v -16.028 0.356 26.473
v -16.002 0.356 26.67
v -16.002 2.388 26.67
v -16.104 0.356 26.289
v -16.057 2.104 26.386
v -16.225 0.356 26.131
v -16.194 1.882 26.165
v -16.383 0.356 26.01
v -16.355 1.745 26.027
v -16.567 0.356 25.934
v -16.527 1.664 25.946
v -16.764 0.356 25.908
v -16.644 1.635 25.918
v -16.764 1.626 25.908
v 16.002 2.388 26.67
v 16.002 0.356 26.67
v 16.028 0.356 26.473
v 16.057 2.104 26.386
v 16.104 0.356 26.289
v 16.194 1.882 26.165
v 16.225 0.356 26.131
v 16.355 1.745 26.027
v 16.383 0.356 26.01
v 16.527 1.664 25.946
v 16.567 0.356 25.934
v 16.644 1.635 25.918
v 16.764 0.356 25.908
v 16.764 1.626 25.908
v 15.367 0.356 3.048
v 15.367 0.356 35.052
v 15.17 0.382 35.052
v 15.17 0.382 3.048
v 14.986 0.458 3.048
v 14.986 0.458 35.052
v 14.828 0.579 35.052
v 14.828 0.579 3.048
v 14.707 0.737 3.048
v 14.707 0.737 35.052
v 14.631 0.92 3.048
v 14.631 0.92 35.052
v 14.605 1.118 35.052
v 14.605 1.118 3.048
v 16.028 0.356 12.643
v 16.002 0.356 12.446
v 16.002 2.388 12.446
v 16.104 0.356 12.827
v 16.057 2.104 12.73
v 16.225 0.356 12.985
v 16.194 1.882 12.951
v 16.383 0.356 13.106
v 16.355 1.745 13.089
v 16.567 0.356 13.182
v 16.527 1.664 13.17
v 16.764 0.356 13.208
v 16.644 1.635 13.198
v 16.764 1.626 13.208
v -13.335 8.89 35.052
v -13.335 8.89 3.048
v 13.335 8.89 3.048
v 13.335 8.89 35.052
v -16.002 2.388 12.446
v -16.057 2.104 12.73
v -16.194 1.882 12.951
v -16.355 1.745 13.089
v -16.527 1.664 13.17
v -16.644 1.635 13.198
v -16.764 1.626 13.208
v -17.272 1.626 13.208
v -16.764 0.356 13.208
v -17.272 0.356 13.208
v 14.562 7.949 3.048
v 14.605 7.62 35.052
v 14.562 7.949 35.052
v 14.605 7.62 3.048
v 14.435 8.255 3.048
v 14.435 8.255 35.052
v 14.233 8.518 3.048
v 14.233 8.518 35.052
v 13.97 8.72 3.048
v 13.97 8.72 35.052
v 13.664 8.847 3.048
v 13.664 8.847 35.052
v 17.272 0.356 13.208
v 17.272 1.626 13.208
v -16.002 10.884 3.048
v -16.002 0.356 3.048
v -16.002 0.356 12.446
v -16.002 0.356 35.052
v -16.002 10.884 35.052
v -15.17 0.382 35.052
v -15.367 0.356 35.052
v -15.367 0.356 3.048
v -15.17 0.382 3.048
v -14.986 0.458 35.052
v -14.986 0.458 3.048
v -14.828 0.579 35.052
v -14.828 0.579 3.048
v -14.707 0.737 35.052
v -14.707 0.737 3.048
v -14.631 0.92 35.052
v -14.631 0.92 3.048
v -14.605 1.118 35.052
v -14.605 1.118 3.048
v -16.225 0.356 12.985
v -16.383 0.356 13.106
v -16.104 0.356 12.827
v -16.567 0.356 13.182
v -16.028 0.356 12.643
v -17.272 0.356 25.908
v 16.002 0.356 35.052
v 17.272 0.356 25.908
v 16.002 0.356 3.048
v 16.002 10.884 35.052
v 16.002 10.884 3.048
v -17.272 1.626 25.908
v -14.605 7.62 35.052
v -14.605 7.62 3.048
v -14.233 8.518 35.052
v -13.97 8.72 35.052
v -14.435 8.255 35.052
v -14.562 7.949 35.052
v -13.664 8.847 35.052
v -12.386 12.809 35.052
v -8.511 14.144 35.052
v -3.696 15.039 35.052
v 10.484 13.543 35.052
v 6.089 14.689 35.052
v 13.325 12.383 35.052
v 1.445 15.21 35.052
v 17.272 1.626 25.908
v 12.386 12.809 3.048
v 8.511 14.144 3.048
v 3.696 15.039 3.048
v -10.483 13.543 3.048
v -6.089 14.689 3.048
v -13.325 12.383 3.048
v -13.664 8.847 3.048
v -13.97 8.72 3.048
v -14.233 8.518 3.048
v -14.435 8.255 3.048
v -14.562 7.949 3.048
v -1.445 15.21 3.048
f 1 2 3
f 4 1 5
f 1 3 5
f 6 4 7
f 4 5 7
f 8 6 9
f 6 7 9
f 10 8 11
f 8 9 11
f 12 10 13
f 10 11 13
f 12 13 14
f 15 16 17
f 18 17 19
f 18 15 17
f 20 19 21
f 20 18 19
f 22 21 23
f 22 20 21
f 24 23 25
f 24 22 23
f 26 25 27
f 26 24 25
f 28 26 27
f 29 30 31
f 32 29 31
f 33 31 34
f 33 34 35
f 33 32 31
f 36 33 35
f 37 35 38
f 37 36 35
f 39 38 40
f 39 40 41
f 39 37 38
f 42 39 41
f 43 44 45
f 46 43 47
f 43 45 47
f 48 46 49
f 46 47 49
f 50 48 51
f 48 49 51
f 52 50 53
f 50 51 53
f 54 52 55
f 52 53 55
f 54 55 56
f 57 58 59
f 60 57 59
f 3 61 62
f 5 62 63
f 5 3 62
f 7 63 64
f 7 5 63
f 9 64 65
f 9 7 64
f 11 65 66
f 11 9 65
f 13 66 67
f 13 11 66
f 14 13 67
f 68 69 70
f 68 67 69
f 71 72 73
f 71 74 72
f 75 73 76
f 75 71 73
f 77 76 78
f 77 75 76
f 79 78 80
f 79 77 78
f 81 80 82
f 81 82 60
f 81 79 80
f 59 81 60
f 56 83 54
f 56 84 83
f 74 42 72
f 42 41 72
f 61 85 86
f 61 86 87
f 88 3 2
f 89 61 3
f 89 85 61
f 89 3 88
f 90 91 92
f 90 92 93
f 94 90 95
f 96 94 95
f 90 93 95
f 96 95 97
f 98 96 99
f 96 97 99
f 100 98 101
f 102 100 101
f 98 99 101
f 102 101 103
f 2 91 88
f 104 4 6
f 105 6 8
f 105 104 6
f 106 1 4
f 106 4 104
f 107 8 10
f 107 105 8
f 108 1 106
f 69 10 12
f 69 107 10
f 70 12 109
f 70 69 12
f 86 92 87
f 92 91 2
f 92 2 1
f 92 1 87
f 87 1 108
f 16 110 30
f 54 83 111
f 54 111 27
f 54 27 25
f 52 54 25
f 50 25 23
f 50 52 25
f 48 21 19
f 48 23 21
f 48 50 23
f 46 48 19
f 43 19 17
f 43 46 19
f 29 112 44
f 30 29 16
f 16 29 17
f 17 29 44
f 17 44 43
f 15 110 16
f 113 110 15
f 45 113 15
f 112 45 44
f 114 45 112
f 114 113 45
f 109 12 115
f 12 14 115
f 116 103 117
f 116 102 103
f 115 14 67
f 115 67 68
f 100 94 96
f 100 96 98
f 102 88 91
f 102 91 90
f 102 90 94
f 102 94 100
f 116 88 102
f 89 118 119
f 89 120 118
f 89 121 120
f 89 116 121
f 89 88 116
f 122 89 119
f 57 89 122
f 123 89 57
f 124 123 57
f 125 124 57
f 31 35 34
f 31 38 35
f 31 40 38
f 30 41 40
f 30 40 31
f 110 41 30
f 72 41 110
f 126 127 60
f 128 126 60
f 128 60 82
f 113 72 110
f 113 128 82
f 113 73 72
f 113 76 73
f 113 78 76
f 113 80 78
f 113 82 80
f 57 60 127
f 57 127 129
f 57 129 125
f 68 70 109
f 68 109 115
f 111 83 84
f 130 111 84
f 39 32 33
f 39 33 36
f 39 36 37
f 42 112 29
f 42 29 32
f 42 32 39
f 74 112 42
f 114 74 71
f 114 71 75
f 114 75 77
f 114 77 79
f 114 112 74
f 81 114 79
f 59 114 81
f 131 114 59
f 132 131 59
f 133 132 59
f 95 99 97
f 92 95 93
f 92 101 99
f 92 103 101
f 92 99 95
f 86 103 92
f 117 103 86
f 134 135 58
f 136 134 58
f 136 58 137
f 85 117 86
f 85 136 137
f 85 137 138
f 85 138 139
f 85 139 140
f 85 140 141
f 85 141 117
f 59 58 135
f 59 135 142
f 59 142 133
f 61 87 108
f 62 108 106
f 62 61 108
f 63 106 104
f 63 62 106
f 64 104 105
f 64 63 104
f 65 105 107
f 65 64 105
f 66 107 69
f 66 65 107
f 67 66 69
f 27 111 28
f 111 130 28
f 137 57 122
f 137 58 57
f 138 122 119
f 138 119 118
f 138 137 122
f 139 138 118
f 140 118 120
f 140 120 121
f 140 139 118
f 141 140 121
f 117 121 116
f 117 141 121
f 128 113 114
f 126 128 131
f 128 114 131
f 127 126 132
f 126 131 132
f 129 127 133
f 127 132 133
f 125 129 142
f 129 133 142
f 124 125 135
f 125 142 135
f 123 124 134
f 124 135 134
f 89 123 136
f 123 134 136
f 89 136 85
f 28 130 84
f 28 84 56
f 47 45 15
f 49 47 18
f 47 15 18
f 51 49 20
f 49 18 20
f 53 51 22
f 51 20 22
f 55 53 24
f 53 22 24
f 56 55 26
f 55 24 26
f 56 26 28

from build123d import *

# Parameters (mm, degrees)
SKETCH1_RX              = 22.86
SKETCH1_RY              = 15.24
BOSS_EXTRUDE4_DEPTH     = 45.72
CUT_EXTRUDE2_START      = -10.16
SKETCH4_W               = 29.21
SKETCH4_H               = 17.78
CUT_EXTRUDE2_DEPTH      = 33.02
CUT_EXTRUDE4_DEPTH      = 33.02
CUT_EXTRUDE4_DEPTH_BACK = 33.02
SKETCH7_W               = 14.643913221
SKETCH7_H               = 35.56
SKETCH8_R               = 1.75
CUT_EXTRUDE5_DEPTH      = 1.27
SKETCH9_R               = 0.5
CUT_EXTRUDE7_DEPTH      = 2.794
FILLET1_R               = 1.27
FILLET2_R               = 1.27
SKETCH10_W              = 45.72
SKETCH10_H              = 17.78
CUT_EXTRUDE8_DEPTH      = 47.972834865
CUT_EXTRUDE10_DEPTH     = 47.972834865
SKETCH15_W              = 29.21
SKETCH15_H              = 0.508
CUT_EXTRUDE13_DEPTH     = 42.866874941
SKETCH16_W              = 32.004
SKETCH16_H              = 0.3556
CUT_EXTRUDE14_DEPTH     = 39.891871036
BOSS_EXTRUDE5_START     = -10.16
SKETCH17_W              = 1.27
SKETCH17_H              = 1.27
BOSS_EXTRUDE5_DEPTH     = 12.7
FILLET3_R               = 0.762
FILLET4_R               = 0.762
FILLET5_R               = 0.762
FILLET6_R               = 1.27


with BuildPart() as part:
    # Sketch1 → Boss-Extrude4 (new body)
    with BuildSketch(Plane.XY):
        with Locations(Location((0, 0), (0, 0, 180))):
            Ellipse(SKETCH1_RX, SKETCH1_RY)
    extrude(amount=BOSS_EXTRUDE4_DEPTH)

    # Sketch4 → Cut-Extrude2 (cut)
    with BuildSketch(Plane.XY.offset(45.72).offset(CUT_EXTRUDE2_START)):
        Rectangle(SKETCH4_W, SKETCH4_H)
    extrude(amount=-CUT_EXTRUDE2_DEPTH, mode=Mode.SUBTRACT)

    # Sketch7 → Cut-Extrude4 (cut, two sides: drawn at the far end of the back side and taken through both)
    with BuildSketch(Plane(origin=(0, 0, 0), x_dir=(0, 0, -1), z_dir=(1, 0, 0)).offset(-CUT_EXTRUDE4_DEPTH_BACK)):
        with Locations((-45.421956611, -1.677648267)):
            Rectangle(SKETCH7_W, SKETCH7_H)
    extrude(amount=CUT_EXTRUDE4_DEPTH + CUT_EXTRUDE4_DEPTH_BACK, mode=Mode.SUBTRACT)

    # Sketch8 → Cut-Extrude5 (cut)
    with BuildSketch(Plane.XY):
        Circle(SKETCH8_R)
        with Locations((4.064, 0)):
            Circle(SKETCH8_R)
        with Locations((-4.064, 0)):
            Circle(SKETCH8_R)
    extrude(amount=CUT_EXTRUDE5_DEPTH, mode=Mode.SUBTRACT)

    # Sketch9 → Cut-Extrude7 (cut)
    with BuildSketch(Plane(origin=(0, 0, 0), x_dir=(-1, 0, 0), z_dir=(0, 0, -1))):
        with Locations((0, 0.8)):
            Circle(SKETCH9_R)
        with Locations((0, -0.8)):
            Circle(SKETCH9_R)
        with Locations((-4.064, 0.8)):
            Circle(SKETCH9_R)
        with Locations((-4.064, -0.8)):
            Circle(SKETCH9_R)
        with Locations((4.064, 0.8)):
            Circle(SKETCH9_R)
        with Locations((4.064, -0.8)):
            Circle(SKETCH9_R)
    extrude(amount=-CUT_EXTRUDE7_DEPTH, mode=Mode.SUBTRACT)

    # Fillet1
    fillet1_edges = [part.edges().sort_by_distance(p)[0] for p in [
        (22.859987041, 0.016227247, 0),
    ]]
    fillet(fillet1_edges, radius=FILLET1_R)

    # Fillet2
    fillet2_edges = [part.edges().sort_by_distance(p)[0] for p in [
        (22.860000074, 1.7e-08, 38.1),
    ]]
    fillet(fillet2_edges, radius=FILLET2_R)

    # Sketch10 → Cut-Extrude8 (cut, through all)
    with BuildSketch(Plane(origin=(0, 0, 0), x_dir=(-1, 0, 0), z_dir=(0, 0, -1))):
        with Locations((0, -8.89)):
            Rectangle(SKETCH10_W, SKETCH10_H)
    extrude(amount=-CUT_EXTRUDE8_DEPTH, mode=Mode.SUBTRACT)

    # Sketch13 → Cut-Extrude10 (cut, through all)
    with BuildSketch(Plane.XZ):
        with BuildLine():
            Line((-1.75, 1.27), (1.75, 1.27))
            Line((1.75, 1.27), (1.75, 0))
            Line((1.75, 0), (2.314, 0))
            Line((2.314, 0), (2.314, 1.27))
            Line((2.314, 1.27), (5.814, 1.27))
            Line((5.814, 1.27), (5.814, 0))
            Line((5.814, 0), (21.59, 0))
            ThreePointArc((21.59, 0), (22.488025612, 0.371974388), (22.86, 1.27))
            Line((22.86, 1.27), (22.86, 36.83))
            ThreePointArc((22.86, 36.83), (22.488025612, 37.728025612), (21.59, 38.1))
            Line((21.59, 38.1), (-21.59, 38.1))
            ThreePointArc((-21.59, 38.1), (-22.488025612, 37.728025612), (-22.86, 36.83))
            Line((-22.86, 36.83), (-22.86, 1.27))
            ThreePointArc((-22.86, 1.27), (-22.488025612, 0.371974388), (-21.59, 0))
            Line((-21.59, 0), (-5.814, 0))
            Line((-5.814, 0), (-5.814, 1.27))
            Line((-5.814, 1.27), (-2.314, 1.27))
            Line((-2.314, 1.27), (-2.314, 0))
            Line((-2.314, 0), (-1.75, 0))
            Line((-1.75, 0), (-1.75, 1.27))
        make_face()
        Polygon((16.002, 35.052), (16.002, 3.048), (14.605, 3.048), (14.605, 2.54), (-14.605, 2.54), (-14.605, 3.048), (-16.002, 3.048), (-16.002, 35.052), (-14.605, 35.052), (-14.605, 35.56), (14.605, 35.56), (14.605, 35.052), align=None, mode=Mode.SUBTRACT)
    extrude(amount=-CUT_EXTRUDE10_DEPTH, mode=Mode.SUBTRACT)


with BuildPart() as cut_extrude10_kept_piece:
    # of the separate pieces the step leaves, the one the design keeps (cut_extrude10_pieces_kept)
    add(part.part.solids().sort_by_distance((14.605, 11.724117119, 3.048))[0])

    # Sketch15 → Cut-Extrude13 (cut, through all)
    with BuildSketch(Plane(origin=(0, 0, 0), x_dir=(1, 0, 0), z_dir=(0, 1, 0))):
        with Locations((0, -2.794)):
            Rectangle(SKETCH15_W, SKETCH15_H)
        with Locations((0, -35.306)):
            Rectangle(SKETCH15_W, SKETCH15_H)
    extrude(amount=CUT_EXTRUDE13_DEPTH, mode=Mode.SUBTRACT)

    # Sketch16 → Cut-Extrude14 (cut, through all)
    with BuildSketch(Plane(origin=(0, 0, 3.048), x_dir=(-1, 0, 0), z_dir=(0, 0, -1))):
        with Locations((0, 0.1778)):
            Rectangle(SKETCH16_W, SKETCH16_H)
    extrude(amount=-CUT_EXTRUDE14_DEPTH, mode=Mode.SUBTRACT)

    # Sketch17 → Boss-Extrude5 (add)
    with BuildSketch(Plane(origin=(0, 0, 3.048), x_dir=(-1, 0, 0), z_dir=(0, 0, -1)).offset(BOSS_EXTRUDE5_START)):
        with Locations((-16.637, 0.9906)):
            Rectangle(SKETCH17_W, SKETCH17_H)
        with Locations((16.637, 0.9906)):
            Rectangle(SKETCH17_W, SKETCH17_H)
    extrude(amount=-BOSS_EXTRUDE5_DEPTH)

    # Fillet3
    fillet3_edges = [cut_extrude10_kept_piece.edges().sort_by_distance(p)[0] for p in [
        (16.002, 0.9906, 13.208),
        (16.002, 0.9906, 25.908),
        (16.002, 1.6256, 19.558),
    ]]
    fillet(fillet3_edges, radius=FILLET3_R)

    # Fillet4
    fillet4_edges = [cut_extrude10_kept_piece.edges().sort_by_distance(p)[0] for p in [
        (-16.002, 0.9906, 13.208),
        (-16.002, 1.6256, 19.558),
        (-16.002, 0.9906, 25.908),
    ]]
    fillet(fillet4_edges, radius=FILLET4_R)

    # Fillet5
    fillet5_edges = [cut_extrude10_kept_piece.edges().sort_by_distance(p)[0] for p in [
        (14.605, 0.3556, 19.05),
        (-14.605, 0.3556, 19.05),
    ]]
    fillet(fillet5_edges, radius=FILLET5_R)

    # Fillet6
    fillet6_edges = [cut_extrude10_kept_piece.edges().sort_by_distance(p)[0] for p in [
        (-14.605, 8.89, 19.05),
        (14.605, 8.89, 19.05),
    ]]
    fillet(fillet6_edges, radius=FILLET6_R)


solid = cut_extrude10_kept_piece.part
